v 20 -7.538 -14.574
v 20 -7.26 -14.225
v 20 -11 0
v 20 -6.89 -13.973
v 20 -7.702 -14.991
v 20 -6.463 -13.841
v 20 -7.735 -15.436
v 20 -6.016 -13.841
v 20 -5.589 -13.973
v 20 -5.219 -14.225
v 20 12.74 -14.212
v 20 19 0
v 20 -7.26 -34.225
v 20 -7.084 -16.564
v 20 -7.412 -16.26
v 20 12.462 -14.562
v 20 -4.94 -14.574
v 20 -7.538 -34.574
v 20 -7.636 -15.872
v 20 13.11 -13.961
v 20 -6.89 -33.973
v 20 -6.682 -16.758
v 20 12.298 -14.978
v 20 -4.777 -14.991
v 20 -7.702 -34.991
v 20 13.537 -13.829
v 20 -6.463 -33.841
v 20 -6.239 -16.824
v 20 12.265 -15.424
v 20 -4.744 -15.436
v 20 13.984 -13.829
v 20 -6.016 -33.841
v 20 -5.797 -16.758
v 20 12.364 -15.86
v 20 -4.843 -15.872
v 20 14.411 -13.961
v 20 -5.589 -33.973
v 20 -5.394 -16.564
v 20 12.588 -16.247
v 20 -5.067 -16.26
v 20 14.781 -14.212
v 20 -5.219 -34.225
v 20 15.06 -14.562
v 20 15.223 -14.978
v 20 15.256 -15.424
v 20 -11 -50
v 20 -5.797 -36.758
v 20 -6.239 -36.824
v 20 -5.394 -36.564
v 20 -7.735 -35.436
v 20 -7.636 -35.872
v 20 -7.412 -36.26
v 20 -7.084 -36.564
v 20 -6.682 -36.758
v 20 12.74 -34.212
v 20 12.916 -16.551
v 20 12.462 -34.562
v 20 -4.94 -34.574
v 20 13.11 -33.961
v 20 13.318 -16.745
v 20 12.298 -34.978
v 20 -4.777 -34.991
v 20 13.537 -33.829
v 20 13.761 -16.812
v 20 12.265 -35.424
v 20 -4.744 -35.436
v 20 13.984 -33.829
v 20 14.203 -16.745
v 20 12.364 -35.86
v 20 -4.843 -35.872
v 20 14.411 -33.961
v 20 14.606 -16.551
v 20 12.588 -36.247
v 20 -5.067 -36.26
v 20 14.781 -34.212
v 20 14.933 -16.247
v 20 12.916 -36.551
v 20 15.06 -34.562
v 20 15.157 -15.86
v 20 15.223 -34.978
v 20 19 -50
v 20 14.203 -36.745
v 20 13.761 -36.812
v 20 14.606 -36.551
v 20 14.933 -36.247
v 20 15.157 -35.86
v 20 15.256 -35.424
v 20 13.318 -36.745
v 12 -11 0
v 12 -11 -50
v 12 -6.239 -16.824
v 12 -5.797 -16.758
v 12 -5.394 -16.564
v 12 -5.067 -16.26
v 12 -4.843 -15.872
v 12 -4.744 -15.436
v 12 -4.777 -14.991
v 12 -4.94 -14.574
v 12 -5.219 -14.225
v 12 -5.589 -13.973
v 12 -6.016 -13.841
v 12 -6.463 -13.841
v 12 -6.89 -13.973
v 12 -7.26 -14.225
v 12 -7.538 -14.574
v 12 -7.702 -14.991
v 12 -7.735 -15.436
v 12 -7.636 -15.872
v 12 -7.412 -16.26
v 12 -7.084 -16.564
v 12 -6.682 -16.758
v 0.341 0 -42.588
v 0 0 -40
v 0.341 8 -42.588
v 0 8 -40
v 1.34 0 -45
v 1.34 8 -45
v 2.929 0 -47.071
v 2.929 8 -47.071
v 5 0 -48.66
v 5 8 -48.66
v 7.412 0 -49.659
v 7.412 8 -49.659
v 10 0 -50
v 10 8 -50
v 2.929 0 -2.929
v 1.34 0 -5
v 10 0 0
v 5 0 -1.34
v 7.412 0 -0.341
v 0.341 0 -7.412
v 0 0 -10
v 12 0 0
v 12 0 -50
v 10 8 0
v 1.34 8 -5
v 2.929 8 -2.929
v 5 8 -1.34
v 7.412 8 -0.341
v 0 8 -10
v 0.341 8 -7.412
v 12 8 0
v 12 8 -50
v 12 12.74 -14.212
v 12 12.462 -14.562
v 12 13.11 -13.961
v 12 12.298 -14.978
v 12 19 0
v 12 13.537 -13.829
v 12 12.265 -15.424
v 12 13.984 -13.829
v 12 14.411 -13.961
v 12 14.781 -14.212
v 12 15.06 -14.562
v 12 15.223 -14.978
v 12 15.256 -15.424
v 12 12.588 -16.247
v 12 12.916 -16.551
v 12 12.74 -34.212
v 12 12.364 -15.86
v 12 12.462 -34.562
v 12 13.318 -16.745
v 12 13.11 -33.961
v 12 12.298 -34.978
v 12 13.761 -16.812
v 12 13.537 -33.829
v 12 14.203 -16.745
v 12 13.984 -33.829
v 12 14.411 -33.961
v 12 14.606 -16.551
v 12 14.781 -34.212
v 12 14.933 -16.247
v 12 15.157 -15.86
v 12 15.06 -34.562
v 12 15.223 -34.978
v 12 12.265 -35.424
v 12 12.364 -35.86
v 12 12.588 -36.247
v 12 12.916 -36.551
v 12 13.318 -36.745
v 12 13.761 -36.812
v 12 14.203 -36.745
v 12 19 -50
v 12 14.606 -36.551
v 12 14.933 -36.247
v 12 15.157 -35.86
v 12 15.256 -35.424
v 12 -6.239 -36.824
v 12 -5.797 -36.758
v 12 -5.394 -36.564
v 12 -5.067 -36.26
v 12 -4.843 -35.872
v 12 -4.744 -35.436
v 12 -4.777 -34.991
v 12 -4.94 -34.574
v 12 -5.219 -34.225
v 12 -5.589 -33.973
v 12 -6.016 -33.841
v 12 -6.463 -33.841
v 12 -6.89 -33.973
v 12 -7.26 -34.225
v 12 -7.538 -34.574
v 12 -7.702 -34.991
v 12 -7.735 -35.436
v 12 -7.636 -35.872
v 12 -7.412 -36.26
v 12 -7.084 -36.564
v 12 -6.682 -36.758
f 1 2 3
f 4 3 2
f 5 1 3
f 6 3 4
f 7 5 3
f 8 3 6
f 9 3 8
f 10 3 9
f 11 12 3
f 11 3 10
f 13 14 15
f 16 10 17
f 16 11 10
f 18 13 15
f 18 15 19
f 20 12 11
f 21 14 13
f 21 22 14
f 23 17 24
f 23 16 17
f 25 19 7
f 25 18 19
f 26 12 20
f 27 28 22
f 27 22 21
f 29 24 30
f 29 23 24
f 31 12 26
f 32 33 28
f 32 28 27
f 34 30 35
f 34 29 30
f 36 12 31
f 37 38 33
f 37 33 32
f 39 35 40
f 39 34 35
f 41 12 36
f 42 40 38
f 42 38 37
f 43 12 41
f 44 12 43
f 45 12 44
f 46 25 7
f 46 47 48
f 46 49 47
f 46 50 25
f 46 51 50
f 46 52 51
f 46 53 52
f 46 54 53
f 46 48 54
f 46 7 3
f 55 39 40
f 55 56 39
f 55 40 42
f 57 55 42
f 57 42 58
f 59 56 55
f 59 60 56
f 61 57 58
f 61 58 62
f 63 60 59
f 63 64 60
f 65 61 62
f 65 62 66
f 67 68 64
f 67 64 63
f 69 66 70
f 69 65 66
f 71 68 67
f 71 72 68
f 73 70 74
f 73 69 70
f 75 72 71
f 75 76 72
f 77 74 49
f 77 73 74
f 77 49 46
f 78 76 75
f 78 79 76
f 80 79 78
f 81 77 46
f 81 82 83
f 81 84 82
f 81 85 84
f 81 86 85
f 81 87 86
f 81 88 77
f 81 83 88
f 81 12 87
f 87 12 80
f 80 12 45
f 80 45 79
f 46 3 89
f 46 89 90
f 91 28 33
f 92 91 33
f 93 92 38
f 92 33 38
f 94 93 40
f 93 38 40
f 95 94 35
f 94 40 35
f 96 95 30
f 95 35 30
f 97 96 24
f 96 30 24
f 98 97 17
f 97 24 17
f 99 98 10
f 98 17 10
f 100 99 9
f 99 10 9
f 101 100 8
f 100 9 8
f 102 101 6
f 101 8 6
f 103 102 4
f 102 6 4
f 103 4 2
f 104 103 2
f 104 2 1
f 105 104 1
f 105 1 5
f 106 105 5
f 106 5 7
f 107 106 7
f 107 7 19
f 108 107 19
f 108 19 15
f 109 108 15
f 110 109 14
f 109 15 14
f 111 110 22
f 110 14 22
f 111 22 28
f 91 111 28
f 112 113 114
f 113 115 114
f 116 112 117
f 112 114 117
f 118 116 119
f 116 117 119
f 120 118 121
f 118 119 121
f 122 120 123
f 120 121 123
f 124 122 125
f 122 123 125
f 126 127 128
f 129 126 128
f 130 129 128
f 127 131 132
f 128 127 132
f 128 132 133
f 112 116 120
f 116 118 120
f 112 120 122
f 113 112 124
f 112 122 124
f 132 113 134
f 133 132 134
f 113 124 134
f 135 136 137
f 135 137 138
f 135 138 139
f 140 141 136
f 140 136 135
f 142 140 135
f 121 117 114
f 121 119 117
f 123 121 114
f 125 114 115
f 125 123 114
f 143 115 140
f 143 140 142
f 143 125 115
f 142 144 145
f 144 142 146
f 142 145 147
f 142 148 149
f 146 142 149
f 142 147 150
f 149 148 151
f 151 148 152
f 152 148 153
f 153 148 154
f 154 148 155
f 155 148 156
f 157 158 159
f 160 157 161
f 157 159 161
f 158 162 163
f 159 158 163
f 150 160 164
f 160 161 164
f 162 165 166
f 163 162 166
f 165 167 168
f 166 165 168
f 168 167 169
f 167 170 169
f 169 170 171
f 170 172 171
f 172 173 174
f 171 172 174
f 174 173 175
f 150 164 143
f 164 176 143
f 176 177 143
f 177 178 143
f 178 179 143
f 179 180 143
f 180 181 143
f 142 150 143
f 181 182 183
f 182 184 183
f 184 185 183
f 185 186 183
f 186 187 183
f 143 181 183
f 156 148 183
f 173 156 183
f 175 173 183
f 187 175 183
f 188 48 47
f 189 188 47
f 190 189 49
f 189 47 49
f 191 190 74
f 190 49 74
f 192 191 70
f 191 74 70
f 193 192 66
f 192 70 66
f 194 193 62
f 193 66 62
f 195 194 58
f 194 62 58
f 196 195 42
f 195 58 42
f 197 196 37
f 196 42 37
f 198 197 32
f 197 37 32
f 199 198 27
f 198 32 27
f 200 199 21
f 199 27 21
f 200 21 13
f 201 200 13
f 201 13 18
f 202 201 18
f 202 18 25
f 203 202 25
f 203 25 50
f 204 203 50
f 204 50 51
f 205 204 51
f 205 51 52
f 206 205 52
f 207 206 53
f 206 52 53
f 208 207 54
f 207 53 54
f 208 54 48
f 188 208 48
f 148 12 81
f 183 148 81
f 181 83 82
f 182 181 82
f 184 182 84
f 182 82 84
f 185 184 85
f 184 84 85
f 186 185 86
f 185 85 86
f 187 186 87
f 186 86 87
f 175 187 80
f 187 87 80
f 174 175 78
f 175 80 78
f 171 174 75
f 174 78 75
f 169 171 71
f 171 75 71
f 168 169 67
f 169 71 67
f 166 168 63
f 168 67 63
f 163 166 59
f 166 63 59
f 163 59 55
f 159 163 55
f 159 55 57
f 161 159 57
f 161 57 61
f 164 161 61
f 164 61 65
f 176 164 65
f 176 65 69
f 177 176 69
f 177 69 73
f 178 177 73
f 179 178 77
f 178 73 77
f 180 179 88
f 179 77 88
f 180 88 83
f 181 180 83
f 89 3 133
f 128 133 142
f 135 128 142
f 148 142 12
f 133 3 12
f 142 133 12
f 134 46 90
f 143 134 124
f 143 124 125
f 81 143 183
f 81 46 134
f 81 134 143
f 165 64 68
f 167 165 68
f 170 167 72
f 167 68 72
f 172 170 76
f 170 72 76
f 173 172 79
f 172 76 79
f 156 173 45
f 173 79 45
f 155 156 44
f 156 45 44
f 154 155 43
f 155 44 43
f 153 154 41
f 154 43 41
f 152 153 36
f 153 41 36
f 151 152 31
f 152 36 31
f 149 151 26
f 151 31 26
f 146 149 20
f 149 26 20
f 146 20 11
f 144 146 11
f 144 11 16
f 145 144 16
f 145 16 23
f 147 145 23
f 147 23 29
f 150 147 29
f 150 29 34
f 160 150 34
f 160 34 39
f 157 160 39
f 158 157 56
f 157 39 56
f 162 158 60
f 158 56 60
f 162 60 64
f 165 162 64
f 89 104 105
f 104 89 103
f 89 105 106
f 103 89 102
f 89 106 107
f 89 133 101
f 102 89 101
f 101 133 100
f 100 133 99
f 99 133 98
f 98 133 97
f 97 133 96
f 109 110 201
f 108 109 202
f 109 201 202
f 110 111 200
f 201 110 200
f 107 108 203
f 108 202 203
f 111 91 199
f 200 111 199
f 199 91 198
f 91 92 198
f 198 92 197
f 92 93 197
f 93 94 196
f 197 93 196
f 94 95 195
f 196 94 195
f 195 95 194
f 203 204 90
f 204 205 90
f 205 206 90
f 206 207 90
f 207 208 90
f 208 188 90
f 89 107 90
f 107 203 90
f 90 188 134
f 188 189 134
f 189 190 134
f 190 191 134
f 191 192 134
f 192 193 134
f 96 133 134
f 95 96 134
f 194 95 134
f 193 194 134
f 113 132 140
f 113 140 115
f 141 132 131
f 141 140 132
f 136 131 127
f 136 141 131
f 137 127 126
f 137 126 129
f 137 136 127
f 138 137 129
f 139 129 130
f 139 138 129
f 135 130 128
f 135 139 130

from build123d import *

# Parameters (mm, degrees)
SKETCH1_W           = 20
SKETCH1_H           = 50
BOSS_EXTRUDE1_DEPTH = 8
FILLET1_R           = 10
SKETCH2_W           = 50
SKETCH2_H           = 30
BOSS_EXTRUDE2_DEPTH = 8
SKETCH3_R           = 1.5
CUT_EXTRUDE1_DEPTH  = 8


with BuildPart() as part:
    # Sketch1 → Boss-Extrude1 (new body)
    with BuildSketch(Plane(origin=(0, 0, 0), x_dir=(1, 0, 0), z_dir=(0, 1, 0))):
        with Locations((10, 25)):
            Rectangle(SKETCH1_W, SKETCH1_H)
    extrude(amount=BOSS_EXTRUDE1_DEPTH)

    # Fillet1
    fillet1_edges = [part.edges().sort_by_distance(p)[0] for p in [
        (0, 4, -50),
        (0, 4, 0),
    ]]
    fillet(fillet1_edges, radius=FILLET1_R)

    # Sketch2 → Boss-Extrude2 (add)
    with BuildSketch(Plane(origin=(20, 0, 0), x_dir=(0, 0, -1), z_dir=(1, 0, 0))):
        with Locations((25, 4)):
            Rectangle(SKETCH2_W, SKETCH2_H)
    extrude(amount=-BOSS_EXTRUDE2_DEPTH)

    # Sketch3 → Cut-Extrude1 (cut)
    with BuildSketch(Plane(origin=(20, 0, 0), x_dir=(0, 0, -1), z_dir=(1, 0, 0))):
        with Locations((15.311973507, 13.760568851)):
            Circle(SKETCH3_R)
        with Locations((15.324315829, -6.23942734)):
            Circle(SKETCH3_R)
        with Locations((35.311973507, 13.760568851)):
            Circle(SKETCH3_R)
        with Locations((35.324315829, -6.23942734)):
            Circle(SKETCH3_R)
    extrude(amount=-CUT_EXTRUDE1_DEPTH, mode=Mode.SUBTRACT)


solid = part.part
